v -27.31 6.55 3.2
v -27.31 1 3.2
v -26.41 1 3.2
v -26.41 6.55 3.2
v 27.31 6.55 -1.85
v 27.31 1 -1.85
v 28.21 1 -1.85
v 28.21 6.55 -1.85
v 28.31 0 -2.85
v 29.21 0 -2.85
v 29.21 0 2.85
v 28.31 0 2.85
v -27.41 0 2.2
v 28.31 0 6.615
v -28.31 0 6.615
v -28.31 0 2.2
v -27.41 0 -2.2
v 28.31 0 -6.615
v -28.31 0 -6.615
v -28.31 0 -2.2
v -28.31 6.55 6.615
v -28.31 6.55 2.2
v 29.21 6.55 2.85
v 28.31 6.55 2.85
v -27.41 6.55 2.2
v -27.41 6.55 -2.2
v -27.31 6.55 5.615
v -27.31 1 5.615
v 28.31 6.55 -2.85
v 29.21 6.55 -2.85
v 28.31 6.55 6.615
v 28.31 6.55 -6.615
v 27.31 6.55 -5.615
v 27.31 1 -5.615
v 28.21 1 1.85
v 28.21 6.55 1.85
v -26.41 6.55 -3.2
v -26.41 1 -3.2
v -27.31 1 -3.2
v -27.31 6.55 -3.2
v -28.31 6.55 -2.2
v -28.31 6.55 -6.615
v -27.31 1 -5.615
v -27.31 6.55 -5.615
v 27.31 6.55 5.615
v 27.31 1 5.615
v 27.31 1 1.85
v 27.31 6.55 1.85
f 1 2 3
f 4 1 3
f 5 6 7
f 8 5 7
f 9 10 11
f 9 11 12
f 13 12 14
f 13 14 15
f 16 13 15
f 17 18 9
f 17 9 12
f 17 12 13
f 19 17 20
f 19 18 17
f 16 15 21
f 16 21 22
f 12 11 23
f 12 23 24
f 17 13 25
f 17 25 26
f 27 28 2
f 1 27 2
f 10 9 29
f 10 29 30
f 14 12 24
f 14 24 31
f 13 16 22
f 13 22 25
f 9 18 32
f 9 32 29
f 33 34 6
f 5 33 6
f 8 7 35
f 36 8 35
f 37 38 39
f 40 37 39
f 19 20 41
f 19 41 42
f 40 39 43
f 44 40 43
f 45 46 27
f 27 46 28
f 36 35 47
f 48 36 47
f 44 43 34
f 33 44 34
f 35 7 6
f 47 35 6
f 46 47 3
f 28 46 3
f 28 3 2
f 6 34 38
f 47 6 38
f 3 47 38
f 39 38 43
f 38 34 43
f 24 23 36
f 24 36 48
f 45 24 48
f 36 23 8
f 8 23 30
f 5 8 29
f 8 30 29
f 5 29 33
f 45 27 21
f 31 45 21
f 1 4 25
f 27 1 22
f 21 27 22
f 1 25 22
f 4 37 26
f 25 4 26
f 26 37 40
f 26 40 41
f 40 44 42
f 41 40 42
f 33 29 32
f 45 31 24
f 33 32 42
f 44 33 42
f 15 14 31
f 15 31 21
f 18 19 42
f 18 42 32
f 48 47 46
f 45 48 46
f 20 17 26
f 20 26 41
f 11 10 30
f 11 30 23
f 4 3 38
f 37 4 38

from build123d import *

# Parameters (mm, degrees)
BOSS_EXTRUDE1_DEPTH = 6.55
SHELL1_T            = -1


with BuildPart() as part:
    # Sketch1 → Boss-Extrude1 (new body)
    with BuildSketch(Plane(origin=(0, 0, 0), x_dir=(1, 0, 0), z_dir=(0, 1, 0))):
        Polygon((28.31, 6.615), (28.31, 2.85), (29.21, 2.85), (29.21, -2.85), (28.31, -2.85), (28.31, -6.615), (-28.31, -6.615), (-28.31, -2.2), (-27.41, -2.2), (-27.41, 2.2), (-28.31, 2.2), (-28.31, 6.615), align=None)
    extrude(amount=BOSS_EXTRUDE1_DEPTH)

    # Shell1
    shell1_openings = [part.faces().sort_by_distance(p)[0] for p in [
        (0.3, 6.55, 0),
    ]]
    offset(amount=SHELL1_T, openings=shell1_openings, kind=Kind.INTERSECTION)


solid = part.part
